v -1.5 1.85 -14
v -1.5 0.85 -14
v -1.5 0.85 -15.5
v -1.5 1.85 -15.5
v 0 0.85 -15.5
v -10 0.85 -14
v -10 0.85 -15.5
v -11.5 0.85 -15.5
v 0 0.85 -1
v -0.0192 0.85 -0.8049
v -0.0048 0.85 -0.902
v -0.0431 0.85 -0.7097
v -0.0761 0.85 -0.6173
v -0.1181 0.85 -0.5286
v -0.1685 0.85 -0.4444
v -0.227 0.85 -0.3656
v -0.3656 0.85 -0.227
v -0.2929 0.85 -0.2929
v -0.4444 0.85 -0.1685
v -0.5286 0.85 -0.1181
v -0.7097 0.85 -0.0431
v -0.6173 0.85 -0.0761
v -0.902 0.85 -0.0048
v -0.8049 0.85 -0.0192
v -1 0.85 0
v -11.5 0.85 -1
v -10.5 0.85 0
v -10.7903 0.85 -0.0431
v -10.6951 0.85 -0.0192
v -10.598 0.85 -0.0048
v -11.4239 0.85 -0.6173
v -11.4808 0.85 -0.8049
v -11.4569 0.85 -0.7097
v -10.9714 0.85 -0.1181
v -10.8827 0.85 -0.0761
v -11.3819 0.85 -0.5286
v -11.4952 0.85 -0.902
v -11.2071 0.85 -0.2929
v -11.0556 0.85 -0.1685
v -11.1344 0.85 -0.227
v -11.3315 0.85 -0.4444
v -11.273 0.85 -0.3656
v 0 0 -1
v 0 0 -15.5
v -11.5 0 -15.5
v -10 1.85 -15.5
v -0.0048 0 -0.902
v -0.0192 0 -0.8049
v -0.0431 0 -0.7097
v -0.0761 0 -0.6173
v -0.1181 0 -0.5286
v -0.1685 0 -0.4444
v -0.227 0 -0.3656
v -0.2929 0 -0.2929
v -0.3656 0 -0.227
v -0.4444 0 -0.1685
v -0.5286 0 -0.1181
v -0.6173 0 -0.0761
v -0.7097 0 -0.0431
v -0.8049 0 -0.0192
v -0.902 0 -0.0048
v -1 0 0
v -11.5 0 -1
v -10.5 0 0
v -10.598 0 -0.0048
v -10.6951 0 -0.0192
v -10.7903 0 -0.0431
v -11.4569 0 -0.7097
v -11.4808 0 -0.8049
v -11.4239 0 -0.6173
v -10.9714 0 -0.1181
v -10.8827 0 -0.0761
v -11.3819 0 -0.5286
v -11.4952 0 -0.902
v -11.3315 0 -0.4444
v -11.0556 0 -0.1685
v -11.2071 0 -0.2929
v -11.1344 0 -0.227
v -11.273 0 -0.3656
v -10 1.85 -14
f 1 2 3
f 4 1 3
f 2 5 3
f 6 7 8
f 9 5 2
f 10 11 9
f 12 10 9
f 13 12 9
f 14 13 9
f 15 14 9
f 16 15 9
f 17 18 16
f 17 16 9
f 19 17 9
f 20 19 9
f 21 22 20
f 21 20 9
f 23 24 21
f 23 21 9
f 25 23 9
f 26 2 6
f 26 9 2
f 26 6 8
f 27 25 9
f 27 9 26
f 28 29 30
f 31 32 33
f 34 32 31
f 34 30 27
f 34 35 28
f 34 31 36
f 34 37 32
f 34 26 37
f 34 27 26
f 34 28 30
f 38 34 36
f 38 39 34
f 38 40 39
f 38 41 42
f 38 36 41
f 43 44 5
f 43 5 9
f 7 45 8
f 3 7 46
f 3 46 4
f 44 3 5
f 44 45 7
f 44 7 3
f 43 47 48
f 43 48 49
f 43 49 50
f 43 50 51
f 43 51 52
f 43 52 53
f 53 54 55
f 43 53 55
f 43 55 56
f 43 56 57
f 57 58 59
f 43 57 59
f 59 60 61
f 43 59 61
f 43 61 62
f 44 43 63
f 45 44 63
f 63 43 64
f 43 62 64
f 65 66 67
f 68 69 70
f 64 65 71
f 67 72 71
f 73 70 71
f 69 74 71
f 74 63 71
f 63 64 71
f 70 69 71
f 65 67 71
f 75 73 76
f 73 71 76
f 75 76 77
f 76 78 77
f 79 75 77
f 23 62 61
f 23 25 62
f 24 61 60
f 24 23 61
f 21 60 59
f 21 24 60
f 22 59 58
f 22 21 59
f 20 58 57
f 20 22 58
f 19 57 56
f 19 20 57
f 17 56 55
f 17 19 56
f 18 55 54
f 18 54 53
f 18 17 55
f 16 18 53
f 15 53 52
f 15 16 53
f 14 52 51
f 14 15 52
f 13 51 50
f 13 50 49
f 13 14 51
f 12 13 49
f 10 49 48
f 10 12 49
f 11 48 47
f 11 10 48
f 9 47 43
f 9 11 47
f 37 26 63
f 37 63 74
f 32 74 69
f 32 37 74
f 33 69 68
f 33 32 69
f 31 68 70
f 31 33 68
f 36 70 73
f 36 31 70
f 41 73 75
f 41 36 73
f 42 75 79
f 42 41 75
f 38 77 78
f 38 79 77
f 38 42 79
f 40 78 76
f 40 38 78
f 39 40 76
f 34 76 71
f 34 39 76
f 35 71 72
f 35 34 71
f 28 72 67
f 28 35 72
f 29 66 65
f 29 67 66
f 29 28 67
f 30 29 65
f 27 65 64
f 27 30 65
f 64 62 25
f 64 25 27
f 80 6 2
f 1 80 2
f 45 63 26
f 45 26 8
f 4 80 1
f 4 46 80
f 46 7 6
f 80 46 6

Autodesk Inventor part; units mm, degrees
ref_plane "YZ Plane" through (0, 0, 0) normal (1, 0, 0) x (0, 1, 0)
ref_plane "XZ Plane" through (0, 0, 0) normal (0, 1, 0) x (-1, 0, 0)
ref_plane "XY Plane" through (0, 0, 0) normal (0, 0, 1) x (1, 0, 0)
sketch "스케치1" plane through (0, 0, 0) normal (0, 1, 0) x (-1, 0, 0)
  line L0 (0, 0) -> (11.5, 0)
  line L1 (11.5, 0) -> (11.5, -15.5)
  line L2 (11.5, -15.5) -> (0, -15.5)
  line L3 (0, -15.5) -> (0, 0)
  dimension "d0" = 11.5
  dimension "d1" = 15.5
extrude "돌출1" add sketch "스케치1" along normal blind 0.85
fillet "모깎기1" radius 1 2 edges at (0, 0.425, 0) (-11.5, 0.425, 0)
sketch "스케치2" plane through (0, 0.85, 0) normal (0, 1, 0) x (1, 0, 0)
  line L0 (0, 1) -> (0, 15.5) projected
  line L1 (0, 15.5) -> (-11.5, 15.5) projected
  line L2 (-1.5, 15.5) -> (-10, 15.5)
  line L3 (-10, 15.5) -> (-10, 14)
  line L4 (-10, 14) -> (-1.5, 14)
  line L5 (-1.5, 14) -> (-1.5, 15.5)
  line L6 (-11.5, 15.5) -> (-11.5, 1) projected
  point P0 (0, 0)
  dimension "d5" = 8.5
  dimension "d6" = 1.5
  dimension "d7" = 1.5
  dimension "d13" = 1.5
extrude "돌출2" add sketch "스케치2" along normal blind 1
equation "\"d7\" = d13"
properties part number "_3D 인쇄"
